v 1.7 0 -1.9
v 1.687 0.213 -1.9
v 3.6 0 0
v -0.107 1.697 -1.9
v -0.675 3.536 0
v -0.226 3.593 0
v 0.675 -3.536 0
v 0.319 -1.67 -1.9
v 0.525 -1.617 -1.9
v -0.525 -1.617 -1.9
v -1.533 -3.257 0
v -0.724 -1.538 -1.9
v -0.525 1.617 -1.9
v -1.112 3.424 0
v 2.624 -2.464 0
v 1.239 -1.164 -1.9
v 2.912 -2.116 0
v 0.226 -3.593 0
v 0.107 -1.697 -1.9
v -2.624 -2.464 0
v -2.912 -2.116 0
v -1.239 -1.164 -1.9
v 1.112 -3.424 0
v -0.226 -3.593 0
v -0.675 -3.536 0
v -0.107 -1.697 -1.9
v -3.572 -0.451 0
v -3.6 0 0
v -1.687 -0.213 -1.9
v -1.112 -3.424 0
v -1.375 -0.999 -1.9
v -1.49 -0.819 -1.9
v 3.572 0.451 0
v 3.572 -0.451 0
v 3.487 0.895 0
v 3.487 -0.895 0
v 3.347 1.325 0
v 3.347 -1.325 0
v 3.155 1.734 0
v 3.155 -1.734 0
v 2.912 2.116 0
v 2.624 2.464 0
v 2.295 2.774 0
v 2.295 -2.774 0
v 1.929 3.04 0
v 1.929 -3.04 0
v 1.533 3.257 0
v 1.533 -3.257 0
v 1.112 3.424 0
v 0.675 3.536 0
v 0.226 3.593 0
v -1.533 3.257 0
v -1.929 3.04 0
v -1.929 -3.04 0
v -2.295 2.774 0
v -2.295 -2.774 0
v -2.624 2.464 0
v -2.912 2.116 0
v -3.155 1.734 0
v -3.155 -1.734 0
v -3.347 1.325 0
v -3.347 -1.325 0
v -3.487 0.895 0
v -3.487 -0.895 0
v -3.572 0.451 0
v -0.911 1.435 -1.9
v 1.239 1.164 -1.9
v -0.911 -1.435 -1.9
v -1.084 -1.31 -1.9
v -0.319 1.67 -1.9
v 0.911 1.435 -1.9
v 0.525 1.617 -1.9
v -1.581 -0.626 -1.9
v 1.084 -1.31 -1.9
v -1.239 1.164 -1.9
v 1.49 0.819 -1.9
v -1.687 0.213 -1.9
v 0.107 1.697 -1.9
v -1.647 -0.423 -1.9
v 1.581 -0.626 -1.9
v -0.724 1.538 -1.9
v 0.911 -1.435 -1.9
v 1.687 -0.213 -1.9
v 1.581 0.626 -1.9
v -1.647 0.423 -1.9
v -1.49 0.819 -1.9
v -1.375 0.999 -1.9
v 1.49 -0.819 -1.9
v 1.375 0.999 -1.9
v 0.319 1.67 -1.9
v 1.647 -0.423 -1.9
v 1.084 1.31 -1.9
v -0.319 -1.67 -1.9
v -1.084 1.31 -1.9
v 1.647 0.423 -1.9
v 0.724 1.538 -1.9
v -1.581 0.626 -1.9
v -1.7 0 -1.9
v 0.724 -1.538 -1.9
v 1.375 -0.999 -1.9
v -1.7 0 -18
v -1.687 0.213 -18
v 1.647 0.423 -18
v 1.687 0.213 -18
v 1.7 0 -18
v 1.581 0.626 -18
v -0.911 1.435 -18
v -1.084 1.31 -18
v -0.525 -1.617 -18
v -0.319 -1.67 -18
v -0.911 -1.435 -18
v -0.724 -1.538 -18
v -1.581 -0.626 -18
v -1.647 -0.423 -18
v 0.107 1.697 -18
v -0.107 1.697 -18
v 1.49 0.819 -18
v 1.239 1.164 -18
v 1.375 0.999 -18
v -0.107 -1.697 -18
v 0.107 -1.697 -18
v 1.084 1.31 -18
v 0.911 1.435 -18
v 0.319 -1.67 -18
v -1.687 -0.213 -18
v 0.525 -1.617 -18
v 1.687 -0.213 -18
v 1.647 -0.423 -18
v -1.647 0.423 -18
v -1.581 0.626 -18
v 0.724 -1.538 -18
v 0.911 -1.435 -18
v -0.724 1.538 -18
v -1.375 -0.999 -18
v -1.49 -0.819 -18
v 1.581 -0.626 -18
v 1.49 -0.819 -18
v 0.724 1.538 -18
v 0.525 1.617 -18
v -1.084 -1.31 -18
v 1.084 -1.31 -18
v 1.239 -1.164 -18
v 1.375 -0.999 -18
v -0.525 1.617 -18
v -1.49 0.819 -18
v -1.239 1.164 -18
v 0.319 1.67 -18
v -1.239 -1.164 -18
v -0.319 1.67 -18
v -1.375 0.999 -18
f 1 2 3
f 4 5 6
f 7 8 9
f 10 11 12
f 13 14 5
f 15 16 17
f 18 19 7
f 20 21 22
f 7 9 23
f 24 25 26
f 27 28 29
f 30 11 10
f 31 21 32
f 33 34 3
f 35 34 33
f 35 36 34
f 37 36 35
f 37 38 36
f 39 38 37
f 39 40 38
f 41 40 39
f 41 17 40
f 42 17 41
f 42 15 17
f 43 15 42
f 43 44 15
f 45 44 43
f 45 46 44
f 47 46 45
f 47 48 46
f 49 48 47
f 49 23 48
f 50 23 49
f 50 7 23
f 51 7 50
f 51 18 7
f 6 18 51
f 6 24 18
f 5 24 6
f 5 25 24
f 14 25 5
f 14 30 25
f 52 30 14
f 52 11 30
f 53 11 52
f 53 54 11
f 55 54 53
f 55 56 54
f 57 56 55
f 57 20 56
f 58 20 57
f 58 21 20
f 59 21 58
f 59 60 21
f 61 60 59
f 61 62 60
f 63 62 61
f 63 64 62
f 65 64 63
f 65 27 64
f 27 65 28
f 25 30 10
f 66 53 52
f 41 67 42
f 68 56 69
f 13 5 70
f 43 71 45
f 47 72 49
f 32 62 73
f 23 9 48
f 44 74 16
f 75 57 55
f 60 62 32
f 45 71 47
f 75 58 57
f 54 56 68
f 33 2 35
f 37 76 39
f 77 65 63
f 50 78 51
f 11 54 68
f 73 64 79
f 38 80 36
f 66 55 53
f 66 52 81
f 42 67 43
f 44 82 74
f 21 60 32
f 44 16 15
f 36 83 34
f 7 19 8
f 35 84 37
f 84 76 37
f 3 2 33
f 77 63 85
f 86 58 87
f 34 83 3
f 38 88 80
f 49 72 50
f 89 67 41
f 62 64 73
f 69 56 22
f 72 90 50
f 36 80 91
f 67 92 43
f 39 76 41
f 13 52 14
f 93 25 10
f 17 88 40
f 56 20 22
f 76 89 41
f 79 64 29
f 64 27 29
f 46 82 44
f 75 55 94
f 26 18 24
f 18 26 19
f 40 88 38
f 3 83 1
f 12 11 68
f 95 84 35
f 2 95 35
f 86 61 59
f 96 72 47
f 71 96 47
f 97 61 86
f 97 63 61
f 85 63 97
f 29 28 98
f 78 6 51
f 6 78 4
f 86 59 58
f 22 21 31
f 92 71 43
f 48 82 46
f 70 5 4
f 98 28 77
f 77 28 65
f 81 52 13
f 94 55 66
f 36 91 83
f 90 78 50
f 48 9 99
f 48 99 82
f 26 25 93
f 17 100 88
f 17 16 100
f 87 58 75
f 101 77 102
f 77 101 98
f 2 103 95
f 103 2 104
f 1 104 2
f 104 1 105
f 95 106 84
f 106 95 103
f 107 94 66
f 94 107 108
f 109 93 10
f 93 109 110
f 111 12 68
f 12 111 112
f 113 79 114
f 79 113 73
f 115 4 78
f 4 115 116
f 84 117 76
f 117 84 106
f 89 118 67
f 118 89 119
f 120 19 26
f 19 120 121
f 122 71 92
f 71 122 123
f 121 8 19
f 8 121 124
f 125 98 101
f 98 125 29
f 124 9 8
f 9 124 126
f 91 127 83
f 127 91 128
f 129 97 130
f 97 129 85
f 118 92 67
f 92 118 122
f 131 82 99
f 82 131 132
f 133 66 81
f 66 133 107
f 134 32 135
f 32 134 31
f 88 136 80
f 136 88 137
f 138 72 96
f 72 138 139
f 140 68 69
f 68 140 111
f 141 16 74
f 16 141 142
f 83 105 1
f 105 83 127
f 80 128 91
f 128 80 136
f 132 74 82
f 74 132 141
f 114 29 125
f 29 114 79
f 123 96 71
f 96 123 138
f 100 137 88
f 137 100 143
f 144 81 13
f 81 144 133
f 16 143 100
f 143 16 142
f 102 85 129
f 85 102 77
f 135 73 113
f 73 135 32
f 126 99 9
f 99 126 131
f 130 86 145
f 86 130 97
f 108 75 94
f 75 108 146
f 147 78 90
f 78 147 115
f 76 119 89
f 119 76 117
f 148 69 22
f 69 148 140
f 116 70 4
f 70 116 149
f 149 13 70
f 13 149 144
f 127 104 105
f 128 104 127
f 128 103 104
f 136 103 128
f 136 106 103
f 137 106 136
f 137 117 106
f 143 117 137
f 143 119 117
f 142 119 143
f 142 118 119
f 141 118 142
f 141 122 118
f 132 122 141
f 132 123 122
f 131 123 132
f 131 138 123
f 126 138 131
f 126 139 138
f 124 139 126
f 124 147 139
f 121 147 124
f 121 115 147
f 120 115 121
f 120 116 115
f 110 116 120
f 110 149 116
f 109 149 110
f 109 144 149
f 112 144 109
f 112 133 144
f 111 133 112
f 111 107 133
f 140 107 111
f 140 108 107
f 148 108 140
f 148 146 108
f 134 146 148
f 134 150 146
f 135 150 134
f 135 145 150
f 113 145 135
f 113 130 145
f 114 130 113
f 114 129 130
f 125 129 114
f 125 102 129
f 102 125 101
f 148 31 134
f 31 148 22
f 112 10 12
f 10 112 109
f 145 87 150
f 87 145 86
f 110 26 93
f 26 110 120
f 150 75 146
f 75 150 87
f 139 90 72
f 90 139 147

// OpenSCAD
// Generated by SolidPython 1.1.3 on 2023-03-13 21:06:12
$fn = 50;


difference() {
	union() {
		translate(v = [0, 0, -1.9000000000]) {
			rotate(a = [0, 0, 0]) {
				cylinder(h = 1.9000000000, r1 = 1.7000000000, r2 = 3.6000000000);
			}
		}
		translate(v = [0, 0, -18]) {
			rotate(a = [0, 0, 0]) {
				cylinder(h = 18, r = 1.7000000000);
			}
		}
	}
	union();
}
/***********************************************
*********      SolidPython code:      **********
************************************************
 
from solid import *
import os
import subprocess

import oomB

import opsc_library_gen

mode = "laser"
#mode = "3d_print"

defined_objects = {}

radius_dict = {}
countersunk_dict = {}


def set_mode(m):
    global mode
    mode = m
    radius_dict['M6'] = 6.5/2
    radius_dict['M3'] = 3.3/2
    if mode == "laser":
        radius_dict['M6'] = 6/2
        radius_dict['M3'] = 3/2

    countersunk_dict['M3'] = {}
    countersunk_dict['M3']['little_rad'] = radius_dict['M3']
    countersunk_dict['M3']['big_rad'] = (5.5+0.6)/2
    if mode == "laser":
        countersunk_dict['M3']['big_rad'] = (4.75+0.6)/2
        countersunk_dict['M3']['little_rad'] = (4.75+0.6)/2

    countersunk_dict['M3']['height'] = 1.7


def opsc_make_object(filename, objects, save_type="none",resolution=50, layers = 1, tilediff = 200, mode="laser", overwrite=True):
    if overwrite or not os.path.exists(filename):
        set_mode(mode)
        save_type = save_type.lower()
        os.makedirs(os.path.dirname(filename), exist_ok=True)
        final_object = opsc_get_object(objects, mode = mode)
        # Save the final object to the specified filename    
        scad_render_to_file(final_object, filename, file_header='$fn = %s;' % resolution, include_orig_code=True)
        if save_type == "all":
            saveToAll(filename)
        elif save_type == "dxf":
            saveToDxf(filename)
        if mode == "laser":
            filename_laser = filename.replace(".scad","-flat.scad")
            scad_render_to_file(getLaser(final_object, layers=layers, tilediff=tilediff), filename_laser, file_header='$fn = %s;' % resolution, include_orig_code=True)
            if save_type == "all":
                saveToAll(filename_laser)
            elif save_type == "dxf":
                saveToDxf(filename_laser)


def opsc_get_object(objects, mode = "laser"):
    # Create the solidpython objects only include the positive objects and if they don't have inclusion or their inclusion is either all or mode
    # Initialize an empty list to store the results
    positive_objects = []

    # Iterate over the "objects" list
    for obj in objects:
        # Check if the current object has a "type" key with a value of "positive"
        if obj['type'] == 'positive':
            # Check if the current object has an "inclusion" key and its value matches "mode",
            # or if the current object does not have an "inclusion" key at all
            if not 'inclusion' in obj or obj['inclusion'] == "all" or obj['inclusion'] == mode:
                # Call the "get_opsc_item" function with the current object as an argument
                opsc_item = get_opsc_item(obj)
                # Add the result to the "positive_objects" list
                positive_objects.append(opsc_item)
# Initialize an empty list to store the results
    negative_objects = []

    # Iterate over the "objects" list
    for obj in objects:
        # Check if the current object has a "type" key with a value of "negative"
        if obj['type'] == 'negative':
            # Check if the current object has an "inclusion" key and its value matches "mode",
            # or if the current object does not have an "inclusion" key at all
            if not 'inclusion' in obj or obj['inclusion'] == "all" or obj['inclusion'] == mode:
                # Call the "get_opsc_item" function with the current object as an argument
                opsc_item = get_opsc_item(obj)
                # Add the result to the "negative_objects" list
                negative_objects.append(opsc_item)
    
    #positive_objects = [get_opsc_item(obj) for obj in objects if obj['type'] == 'positive']
    #negative_objects = [get_opsc_item(obj) for obj in objects if obj['type'] == 'negative']
    # Union the positive objects
    positive_object = union()(*positive_objects)
    # Union the negative objects
    negative_object = union()(*negative_objects)
    # Create the final object by subtracting the negative objects from the positive objects
    return difference()(positive_object, negative_object)

def get_opsc_item(params):
    # A dictionary to map radius string values to numerical values
    #radius_dict = {'small': 5, 'medium': 10, 'large': 15}
    # An array of function names for basic shapes
    basic_shapes = ['cube', 'sphere', 'cylinder']
    
    # An array of function names for other shapes
    other_shapes = ['hole', 'slot', 'rounded_rectangle', 'countersunk', 'polyg']
    


    # Convert radius to r if present, and remove radius from the params dictionary
    if 'radius' in params:
        if isinstance(params['radius'], str):
            # Use the radius_dict to map the radius string value to a numerical value
            params['r'] = radius_dict[params['radius']]
        else:
            params['r'] = params['radius']
        del params['radius']
    

    # Check if the object type is a basic shape
    if params['shape'] in basic_shapes:
        # Remove shape and unexpected dictionary values
        allowed_keys = {'size', 'r', 'r1', 'r2', 'd', 'h', 'rw', 'rh', 'dw', 'dh'}
        shape_params = {k: v for k, v in params.items() if k in allowed_keys}

        #params['m'] = "#"
        ###split for adding modifier
        try:
            m = params['m']
            func = globals()[params['shape']]
            return_value = get_opsc_transform(params,func(**shape_params))
            return_value = (return_value).set_modifier(m)
            return return_value
        except KeyError as e:
            return get_opsc_transform(params,globals()[params['shape']](**shape_params))
        
    elif params['shape'] == 'polygon':
        # Remove shape and unexpected dictionary values
        h  = params['height']
        allowed_keys = {'points'}
        shape_params = {k: v for k, v in params.items() if k in allowed_keys}

        # Call the corresponding function for the shape parameter, using ** notation to pass the shape_params dictionary as keyword arguments
        params["rot"] = [0,0,0]        
        try:
            m = params['m']
            func = globals()[params['shape']]
            return_value = get_opsc_transform(params,linear_extrude(h)(globals()[params['shape']](**shape_params)))
            return_value = (return_value).set_modifier(m)
            return return_value
        except KeyError as e:
            return_value = get_opsc_transform(params,linear_extrude(h)(globals()[params['shape']](**shape_params)))
            return_value = (return_value)
            return return_value


    # If the object type is not a basic shape, check if it's a defined object or one of the other shapes
    elif params['shape'] in other_shapes:
        # Call the corresponding function for the shape parameter, passing the params dictionary as an argument
        p2 = copy.deepcopy(params)
        p2["pos"] = [0,0,0]
        return get_opsc_transform(params,globals()[params['shape']](p2))
    
    # If the object is not a basic shape or a defined object, try to import it from a .scad file
    else:
        obj = defined_objects[params['shape']]
        return get_opsc_transform(params,obj)

def get_opsc_transform(params, solid_obj):
    # Rotate the object based on the 'rot' field in the params dictionary, or the 'rotX', 'rotY', and 'rotZ' fields if 'rot' is not present
    rot = params.get('rot', [])
    if rot:
        rotX, rotY, rotZ = rot
    else:
        rotX = params.get('rotX', 0)
        rotY = params.get('rotY', 0)
        rotZ = params.get('rotZ', 0)
    solid_obj = rotate([rotX, rotY, rotZ])(solid_obj)

    # Translate the object based on the 'pos' field in the params dictionary, or the 'x', 'y', and 'z' fields if 'pos' is not present
    pos = params.get('pos', [])
    if pos:
        x, y, z = pos
    else:
        x = params.get('x', 0)
        y = params.get('y', 0)
        z = params.get('z', 0)
    solid_obj = translate([x, y, z])(solid_obj)
    return solid_obj


import random

def opsc_easy_array(type, shape, repeats, pos_start, shift_arr, **kwargs):
    for i in range(0,3):
        repeats.append(1)
        pos_start.append(0)
        shift_arr.append(0)
    return_objects = []

    for x in range(0,repeats[0]):
        for y in range(0,repeats[1]):
            for z in range(0,repeats[2]):
                return_objects.append(opsc_easy(type, shape, pos=[pos_start[0]+x*shift_arr[0],pos_start[1]+y*shift_arr[1],pos_start[2]+z*shift_arr[2]], **kwargs))
    return return_objects                



def opsc_easy(type, shape, **kwargs):
    obj = {
        'type': type,
        'shape': shape
    }
    for param in ['size', 'r', 'r1', 'r2', 'd', 'h', 'rw', 'rh', 'dw', 'dh', 'pos', 'x', 'y', 'z', 'rot', 'rotX', 'rotY', 'rotZ', "w", "inclusion", 'sides', 'height', "m"]:
        if param in kwargs:
            obj[param] = kwargs[param]
    return obj

def hole(params):
    p2 = copy.deepcopy(params)  
    # Check if the radius is a string and replace it with the corresponding value from the dictionary
    if isinstance(p2['r'], str):
        p2['r'] = radius_dict[p2['r']]
    
    # Set the height to 100 if not specified
    if 'h' not in p2:
        p2['h'] = 100
        p2["pos"] = [0,0,-50]
    p2["center"] = True
    # Create the cylinder object
    p2["shape"] = "cylinder"
    p2["type"] = "positive"

    return get_opsc_item(p2)

import copy

def countersunk(params):
    p2 = copy.deepcopy(params)
    counter_rad = p2['r']
    p2['r'] = radius_dict[p2['r']]
    hp = copy.deepcopy(p2)
    hp["type"] = "positive"
    hp["shape"] = "hole"
    del hp["rot"]
    hol = get_opsc_item(hp)
    
    cp = copy.deepcopy(p2)
    cp["h"] = countersunk_dict[counter_rad]["height"]
    cp["r2"] = countersunk_dict[counter_rad]["little_rad"]
    cp["r1"] = countersunk_dict[counter_rad]["big_rad"]
    del cp["r"]
    del cp["rot"]
    cp["type"] = "positive"
    cp["shape"] = "cylinder"
    cp["pos"] = [0,0,0]

    top = get_opsc_item(cp)
    return union()(hol,top)



def slot(params):  
    p2 = copy.deepcopy(params) 
    if isinstance(p2['r'], str):
        p2['r'] = radius_dict[p2['r']]
    p2["type"] = "positive"
    p2["shape"] = "hole"
    del p2["rot"]
    p2["pos"] = [0,0,0]
    left = copy.deepcopy(p2)
    right = copy.deepcopy(p2)
    left["pos"][0] = p2["w"] / 2 - p2["r"] 
    
    right["pos"][0] = -p2["w"] / 2 + p2["r"] 
    pass
    leftObj = get_opsc_item(left)
    rightObj = get_opsc_item(right)
    return hull()(leftObj, rightObj)

def rounded_rectangle(params):   
    p2 = copy.deepcopy(params) 
    p2["h"] = p2["size"][2]
    p2["pos"] = p2.get("pos", [0, 0, 0]) 
    p2["type"] = "positive"
    p2["shape"] = "hole"
    p2["pos"] = [0,0,0]
    
    if 'rot' in p2:
        del p2["rot"]   
    if 'r' not in p2:
        p2["r"] = 5 
    tl = copy.deepcopy(p2)
    tr = copy.deepcopy(p2)
    bl = copy.deepcopy(p2)
    br = copy.deepcopy(p2)
    tl["pos"][0] = -(p2["size"][0] - p2["r"]*2)/2
    tl["pos"][1] = (p2["size"][1] - p2["r"]*2)/2
    tr["pos"][0] = (p2["size"][0] - p2["r"]*2)/2
    tr["pos"][1] = (p2["size"][1] - p2["r"]*2)/2
    bl["pos"][0] = -(p2["size"][0] - p2["r"]*2)/2
    bl["pos"][1] = -(p2["size"][1] - p2["r"]*2)/2
    br["pos"][0] = (p2["size"][0] - p2["r"]*2)/2
    br["pos"][1] = -(p2["size"][1] - p2["r"]*2)/2
    del tl["size"]
    del tr["size"]
    del bl["size"]
    del br["size"]
    tlo = get_opsc_item(tl)
    tro = get_opsc_item(tr)
    blo = get_opsc_item(bl)
    bro = get_opsc_item(br)    
    return hull()(tlo, tro, blo, bro)



def polyg(params):
    p2 = copy.deepcopy(params) 
    p2["type"] = "positive"
    p2["shape"] = "polygon"
    p2["pos"] = [0,0,0]
    sides = p2["sides"]
    radius = p2["r"]    
    angles = [i * 360 / sides for i in range(sides)]
    points = regular_polygon(sides, radius)
    
    p2["points"] = points
    return get_opsc_item(p2)

import math

def regular_polygon(num_sides, radius):
    # Calculate the angle between each side
    angle = 2 * math.pi / num_sides

    # Calculate the points of the polygon
    points = []
    for i in range(num_sides):
        x = radius * math.cos(i * angle)
        y = radius * math.sin(i * angle)
        points.append((x, y))
    return points

def import_scad_object(filename):
    # Import the .scad file and convert it to a solidpython object
    #filename = "parts"
    obj = import_scad(filename)
    return obj.main()



import os
import solid as solidpython

# A dictionary to store the defined objects


def load_scad_objects():
    opsc_library_gen.gen_library(defined_objects)

import random

def test(num_objects):
    objects = []
    for i in range(num_objects):
        # Choose a random shape
        #shape = random.choice(['cube', 'sphere', 'cylinder', 'hole', 'slot', "rounded_rectangle"])
        shape = random.choice(["rounded_rectangle"])

        # Choose a random type
        type = random.choice(['positive', 'negative'])
        
        # Create an empty object dictionary
        obj = {'shape': shape, 'type': type}
        
        # Set shape-specific parameters
        if obj['shape'] in ['cube']:
            obj['size'] =  [random.uniform(5, 15), random.uniform(5, 15), random.uniform(5, 15)]
        if obj['shape'] in ['rounded_rectangle']:
            obj['size'] =  [random.uniform(5, 15), random.uniform(5, 15), random.uniform(5, 15)]
            obj['r'] = random.uniform(0.5, 5)
        elif obj['shape'] == 'sphere':
            obj['r'] = random.uniform(5, 15)
        elif obj['shape'] in ['cylinder', 'hole']:
            obj['r'] = random.uniform(0.5, 5)
            obj['h'] = random.uniform(5, 15)
        elif obj['shape'] == 'slot':
            obj['r'] = random.uniform(0.5, 5)
            obj['h'] = random.uniform(5, 15)
            obj['w'] = random.uniform(5, 15)
        
        # Set a random position and rotation
        obj['pos'] = [random.uniform(-20, 20), random.uniform(-20, 20), random.uniform(-20, 20)]
        obj['rot'] = [random.uniform(-180, 180), random.uniform(-180, 180), random.uniform(-180, 180)]
        
        # Add the object to the list
        objects.append(obj)
    return objects

####### old file saving
def saveToAll(fileIn):
    saveToStl(fileIn)
    saveToDxf(fileIn)
    saveToPng(fileIn)
    saveToSvg(fileIn)

def saveToDxf(fileIn, fileOut="", copy_to_laser=True):
    if fileOut == "":
        fileOut = fileIn.replace(".scad",".dxf")
    saveToFile(fileIn, fileOut)


    
def saveToPng(fileIn, fileOut="",extra="--render"):
    if fileOut == "":
        fileOut = fileIn.replace(".scad",".png")
    saveToFile(fileIn, fileOut)

def saveToStl(fileIn, fileOut=""):
    if fileOut == "":
        fileOut = fileIn.replace(".scad",".stl")
    saveToFile(fileIn, fileOut)
    
def saveToSvg(fileIn, fileOut=""):
    if fileOut == "":
        fileOut = fileIn.replace(".scad",".svg")
    saveToFile(fileIn, fileOut)

def saveToFile(fileIn, fileOut,extra=""):
    #extra = extra + " --colorscheme Tomorrow"

    launchStr = 'openscad -o "' + fileOut + '"' + extra + ' "' + fileIn + '"'
    if ".png" in fileOut:
        launchStr = launchStr + " --render"
    print("            saveToFile launch string: " + launchStr)
    subprocess.run(launchStr)
    x=0

def getLaser(final_object,start=1.5,layers=1,thickness=3,tilediff=200):
        rv= []

        for x in range(layers):
            rv.append(translate([0,x*tilediff,0])(
                    projection()(
                        intersection()(translate([-500,-500,start+x*thickness])(cube(size=[1000,1000,0.1])),
                            final_object
                        )
                    )
            )
            )
            
        return union()(rv)

set_mode("laser")
load_scad_objects() 
 
************************************************/
